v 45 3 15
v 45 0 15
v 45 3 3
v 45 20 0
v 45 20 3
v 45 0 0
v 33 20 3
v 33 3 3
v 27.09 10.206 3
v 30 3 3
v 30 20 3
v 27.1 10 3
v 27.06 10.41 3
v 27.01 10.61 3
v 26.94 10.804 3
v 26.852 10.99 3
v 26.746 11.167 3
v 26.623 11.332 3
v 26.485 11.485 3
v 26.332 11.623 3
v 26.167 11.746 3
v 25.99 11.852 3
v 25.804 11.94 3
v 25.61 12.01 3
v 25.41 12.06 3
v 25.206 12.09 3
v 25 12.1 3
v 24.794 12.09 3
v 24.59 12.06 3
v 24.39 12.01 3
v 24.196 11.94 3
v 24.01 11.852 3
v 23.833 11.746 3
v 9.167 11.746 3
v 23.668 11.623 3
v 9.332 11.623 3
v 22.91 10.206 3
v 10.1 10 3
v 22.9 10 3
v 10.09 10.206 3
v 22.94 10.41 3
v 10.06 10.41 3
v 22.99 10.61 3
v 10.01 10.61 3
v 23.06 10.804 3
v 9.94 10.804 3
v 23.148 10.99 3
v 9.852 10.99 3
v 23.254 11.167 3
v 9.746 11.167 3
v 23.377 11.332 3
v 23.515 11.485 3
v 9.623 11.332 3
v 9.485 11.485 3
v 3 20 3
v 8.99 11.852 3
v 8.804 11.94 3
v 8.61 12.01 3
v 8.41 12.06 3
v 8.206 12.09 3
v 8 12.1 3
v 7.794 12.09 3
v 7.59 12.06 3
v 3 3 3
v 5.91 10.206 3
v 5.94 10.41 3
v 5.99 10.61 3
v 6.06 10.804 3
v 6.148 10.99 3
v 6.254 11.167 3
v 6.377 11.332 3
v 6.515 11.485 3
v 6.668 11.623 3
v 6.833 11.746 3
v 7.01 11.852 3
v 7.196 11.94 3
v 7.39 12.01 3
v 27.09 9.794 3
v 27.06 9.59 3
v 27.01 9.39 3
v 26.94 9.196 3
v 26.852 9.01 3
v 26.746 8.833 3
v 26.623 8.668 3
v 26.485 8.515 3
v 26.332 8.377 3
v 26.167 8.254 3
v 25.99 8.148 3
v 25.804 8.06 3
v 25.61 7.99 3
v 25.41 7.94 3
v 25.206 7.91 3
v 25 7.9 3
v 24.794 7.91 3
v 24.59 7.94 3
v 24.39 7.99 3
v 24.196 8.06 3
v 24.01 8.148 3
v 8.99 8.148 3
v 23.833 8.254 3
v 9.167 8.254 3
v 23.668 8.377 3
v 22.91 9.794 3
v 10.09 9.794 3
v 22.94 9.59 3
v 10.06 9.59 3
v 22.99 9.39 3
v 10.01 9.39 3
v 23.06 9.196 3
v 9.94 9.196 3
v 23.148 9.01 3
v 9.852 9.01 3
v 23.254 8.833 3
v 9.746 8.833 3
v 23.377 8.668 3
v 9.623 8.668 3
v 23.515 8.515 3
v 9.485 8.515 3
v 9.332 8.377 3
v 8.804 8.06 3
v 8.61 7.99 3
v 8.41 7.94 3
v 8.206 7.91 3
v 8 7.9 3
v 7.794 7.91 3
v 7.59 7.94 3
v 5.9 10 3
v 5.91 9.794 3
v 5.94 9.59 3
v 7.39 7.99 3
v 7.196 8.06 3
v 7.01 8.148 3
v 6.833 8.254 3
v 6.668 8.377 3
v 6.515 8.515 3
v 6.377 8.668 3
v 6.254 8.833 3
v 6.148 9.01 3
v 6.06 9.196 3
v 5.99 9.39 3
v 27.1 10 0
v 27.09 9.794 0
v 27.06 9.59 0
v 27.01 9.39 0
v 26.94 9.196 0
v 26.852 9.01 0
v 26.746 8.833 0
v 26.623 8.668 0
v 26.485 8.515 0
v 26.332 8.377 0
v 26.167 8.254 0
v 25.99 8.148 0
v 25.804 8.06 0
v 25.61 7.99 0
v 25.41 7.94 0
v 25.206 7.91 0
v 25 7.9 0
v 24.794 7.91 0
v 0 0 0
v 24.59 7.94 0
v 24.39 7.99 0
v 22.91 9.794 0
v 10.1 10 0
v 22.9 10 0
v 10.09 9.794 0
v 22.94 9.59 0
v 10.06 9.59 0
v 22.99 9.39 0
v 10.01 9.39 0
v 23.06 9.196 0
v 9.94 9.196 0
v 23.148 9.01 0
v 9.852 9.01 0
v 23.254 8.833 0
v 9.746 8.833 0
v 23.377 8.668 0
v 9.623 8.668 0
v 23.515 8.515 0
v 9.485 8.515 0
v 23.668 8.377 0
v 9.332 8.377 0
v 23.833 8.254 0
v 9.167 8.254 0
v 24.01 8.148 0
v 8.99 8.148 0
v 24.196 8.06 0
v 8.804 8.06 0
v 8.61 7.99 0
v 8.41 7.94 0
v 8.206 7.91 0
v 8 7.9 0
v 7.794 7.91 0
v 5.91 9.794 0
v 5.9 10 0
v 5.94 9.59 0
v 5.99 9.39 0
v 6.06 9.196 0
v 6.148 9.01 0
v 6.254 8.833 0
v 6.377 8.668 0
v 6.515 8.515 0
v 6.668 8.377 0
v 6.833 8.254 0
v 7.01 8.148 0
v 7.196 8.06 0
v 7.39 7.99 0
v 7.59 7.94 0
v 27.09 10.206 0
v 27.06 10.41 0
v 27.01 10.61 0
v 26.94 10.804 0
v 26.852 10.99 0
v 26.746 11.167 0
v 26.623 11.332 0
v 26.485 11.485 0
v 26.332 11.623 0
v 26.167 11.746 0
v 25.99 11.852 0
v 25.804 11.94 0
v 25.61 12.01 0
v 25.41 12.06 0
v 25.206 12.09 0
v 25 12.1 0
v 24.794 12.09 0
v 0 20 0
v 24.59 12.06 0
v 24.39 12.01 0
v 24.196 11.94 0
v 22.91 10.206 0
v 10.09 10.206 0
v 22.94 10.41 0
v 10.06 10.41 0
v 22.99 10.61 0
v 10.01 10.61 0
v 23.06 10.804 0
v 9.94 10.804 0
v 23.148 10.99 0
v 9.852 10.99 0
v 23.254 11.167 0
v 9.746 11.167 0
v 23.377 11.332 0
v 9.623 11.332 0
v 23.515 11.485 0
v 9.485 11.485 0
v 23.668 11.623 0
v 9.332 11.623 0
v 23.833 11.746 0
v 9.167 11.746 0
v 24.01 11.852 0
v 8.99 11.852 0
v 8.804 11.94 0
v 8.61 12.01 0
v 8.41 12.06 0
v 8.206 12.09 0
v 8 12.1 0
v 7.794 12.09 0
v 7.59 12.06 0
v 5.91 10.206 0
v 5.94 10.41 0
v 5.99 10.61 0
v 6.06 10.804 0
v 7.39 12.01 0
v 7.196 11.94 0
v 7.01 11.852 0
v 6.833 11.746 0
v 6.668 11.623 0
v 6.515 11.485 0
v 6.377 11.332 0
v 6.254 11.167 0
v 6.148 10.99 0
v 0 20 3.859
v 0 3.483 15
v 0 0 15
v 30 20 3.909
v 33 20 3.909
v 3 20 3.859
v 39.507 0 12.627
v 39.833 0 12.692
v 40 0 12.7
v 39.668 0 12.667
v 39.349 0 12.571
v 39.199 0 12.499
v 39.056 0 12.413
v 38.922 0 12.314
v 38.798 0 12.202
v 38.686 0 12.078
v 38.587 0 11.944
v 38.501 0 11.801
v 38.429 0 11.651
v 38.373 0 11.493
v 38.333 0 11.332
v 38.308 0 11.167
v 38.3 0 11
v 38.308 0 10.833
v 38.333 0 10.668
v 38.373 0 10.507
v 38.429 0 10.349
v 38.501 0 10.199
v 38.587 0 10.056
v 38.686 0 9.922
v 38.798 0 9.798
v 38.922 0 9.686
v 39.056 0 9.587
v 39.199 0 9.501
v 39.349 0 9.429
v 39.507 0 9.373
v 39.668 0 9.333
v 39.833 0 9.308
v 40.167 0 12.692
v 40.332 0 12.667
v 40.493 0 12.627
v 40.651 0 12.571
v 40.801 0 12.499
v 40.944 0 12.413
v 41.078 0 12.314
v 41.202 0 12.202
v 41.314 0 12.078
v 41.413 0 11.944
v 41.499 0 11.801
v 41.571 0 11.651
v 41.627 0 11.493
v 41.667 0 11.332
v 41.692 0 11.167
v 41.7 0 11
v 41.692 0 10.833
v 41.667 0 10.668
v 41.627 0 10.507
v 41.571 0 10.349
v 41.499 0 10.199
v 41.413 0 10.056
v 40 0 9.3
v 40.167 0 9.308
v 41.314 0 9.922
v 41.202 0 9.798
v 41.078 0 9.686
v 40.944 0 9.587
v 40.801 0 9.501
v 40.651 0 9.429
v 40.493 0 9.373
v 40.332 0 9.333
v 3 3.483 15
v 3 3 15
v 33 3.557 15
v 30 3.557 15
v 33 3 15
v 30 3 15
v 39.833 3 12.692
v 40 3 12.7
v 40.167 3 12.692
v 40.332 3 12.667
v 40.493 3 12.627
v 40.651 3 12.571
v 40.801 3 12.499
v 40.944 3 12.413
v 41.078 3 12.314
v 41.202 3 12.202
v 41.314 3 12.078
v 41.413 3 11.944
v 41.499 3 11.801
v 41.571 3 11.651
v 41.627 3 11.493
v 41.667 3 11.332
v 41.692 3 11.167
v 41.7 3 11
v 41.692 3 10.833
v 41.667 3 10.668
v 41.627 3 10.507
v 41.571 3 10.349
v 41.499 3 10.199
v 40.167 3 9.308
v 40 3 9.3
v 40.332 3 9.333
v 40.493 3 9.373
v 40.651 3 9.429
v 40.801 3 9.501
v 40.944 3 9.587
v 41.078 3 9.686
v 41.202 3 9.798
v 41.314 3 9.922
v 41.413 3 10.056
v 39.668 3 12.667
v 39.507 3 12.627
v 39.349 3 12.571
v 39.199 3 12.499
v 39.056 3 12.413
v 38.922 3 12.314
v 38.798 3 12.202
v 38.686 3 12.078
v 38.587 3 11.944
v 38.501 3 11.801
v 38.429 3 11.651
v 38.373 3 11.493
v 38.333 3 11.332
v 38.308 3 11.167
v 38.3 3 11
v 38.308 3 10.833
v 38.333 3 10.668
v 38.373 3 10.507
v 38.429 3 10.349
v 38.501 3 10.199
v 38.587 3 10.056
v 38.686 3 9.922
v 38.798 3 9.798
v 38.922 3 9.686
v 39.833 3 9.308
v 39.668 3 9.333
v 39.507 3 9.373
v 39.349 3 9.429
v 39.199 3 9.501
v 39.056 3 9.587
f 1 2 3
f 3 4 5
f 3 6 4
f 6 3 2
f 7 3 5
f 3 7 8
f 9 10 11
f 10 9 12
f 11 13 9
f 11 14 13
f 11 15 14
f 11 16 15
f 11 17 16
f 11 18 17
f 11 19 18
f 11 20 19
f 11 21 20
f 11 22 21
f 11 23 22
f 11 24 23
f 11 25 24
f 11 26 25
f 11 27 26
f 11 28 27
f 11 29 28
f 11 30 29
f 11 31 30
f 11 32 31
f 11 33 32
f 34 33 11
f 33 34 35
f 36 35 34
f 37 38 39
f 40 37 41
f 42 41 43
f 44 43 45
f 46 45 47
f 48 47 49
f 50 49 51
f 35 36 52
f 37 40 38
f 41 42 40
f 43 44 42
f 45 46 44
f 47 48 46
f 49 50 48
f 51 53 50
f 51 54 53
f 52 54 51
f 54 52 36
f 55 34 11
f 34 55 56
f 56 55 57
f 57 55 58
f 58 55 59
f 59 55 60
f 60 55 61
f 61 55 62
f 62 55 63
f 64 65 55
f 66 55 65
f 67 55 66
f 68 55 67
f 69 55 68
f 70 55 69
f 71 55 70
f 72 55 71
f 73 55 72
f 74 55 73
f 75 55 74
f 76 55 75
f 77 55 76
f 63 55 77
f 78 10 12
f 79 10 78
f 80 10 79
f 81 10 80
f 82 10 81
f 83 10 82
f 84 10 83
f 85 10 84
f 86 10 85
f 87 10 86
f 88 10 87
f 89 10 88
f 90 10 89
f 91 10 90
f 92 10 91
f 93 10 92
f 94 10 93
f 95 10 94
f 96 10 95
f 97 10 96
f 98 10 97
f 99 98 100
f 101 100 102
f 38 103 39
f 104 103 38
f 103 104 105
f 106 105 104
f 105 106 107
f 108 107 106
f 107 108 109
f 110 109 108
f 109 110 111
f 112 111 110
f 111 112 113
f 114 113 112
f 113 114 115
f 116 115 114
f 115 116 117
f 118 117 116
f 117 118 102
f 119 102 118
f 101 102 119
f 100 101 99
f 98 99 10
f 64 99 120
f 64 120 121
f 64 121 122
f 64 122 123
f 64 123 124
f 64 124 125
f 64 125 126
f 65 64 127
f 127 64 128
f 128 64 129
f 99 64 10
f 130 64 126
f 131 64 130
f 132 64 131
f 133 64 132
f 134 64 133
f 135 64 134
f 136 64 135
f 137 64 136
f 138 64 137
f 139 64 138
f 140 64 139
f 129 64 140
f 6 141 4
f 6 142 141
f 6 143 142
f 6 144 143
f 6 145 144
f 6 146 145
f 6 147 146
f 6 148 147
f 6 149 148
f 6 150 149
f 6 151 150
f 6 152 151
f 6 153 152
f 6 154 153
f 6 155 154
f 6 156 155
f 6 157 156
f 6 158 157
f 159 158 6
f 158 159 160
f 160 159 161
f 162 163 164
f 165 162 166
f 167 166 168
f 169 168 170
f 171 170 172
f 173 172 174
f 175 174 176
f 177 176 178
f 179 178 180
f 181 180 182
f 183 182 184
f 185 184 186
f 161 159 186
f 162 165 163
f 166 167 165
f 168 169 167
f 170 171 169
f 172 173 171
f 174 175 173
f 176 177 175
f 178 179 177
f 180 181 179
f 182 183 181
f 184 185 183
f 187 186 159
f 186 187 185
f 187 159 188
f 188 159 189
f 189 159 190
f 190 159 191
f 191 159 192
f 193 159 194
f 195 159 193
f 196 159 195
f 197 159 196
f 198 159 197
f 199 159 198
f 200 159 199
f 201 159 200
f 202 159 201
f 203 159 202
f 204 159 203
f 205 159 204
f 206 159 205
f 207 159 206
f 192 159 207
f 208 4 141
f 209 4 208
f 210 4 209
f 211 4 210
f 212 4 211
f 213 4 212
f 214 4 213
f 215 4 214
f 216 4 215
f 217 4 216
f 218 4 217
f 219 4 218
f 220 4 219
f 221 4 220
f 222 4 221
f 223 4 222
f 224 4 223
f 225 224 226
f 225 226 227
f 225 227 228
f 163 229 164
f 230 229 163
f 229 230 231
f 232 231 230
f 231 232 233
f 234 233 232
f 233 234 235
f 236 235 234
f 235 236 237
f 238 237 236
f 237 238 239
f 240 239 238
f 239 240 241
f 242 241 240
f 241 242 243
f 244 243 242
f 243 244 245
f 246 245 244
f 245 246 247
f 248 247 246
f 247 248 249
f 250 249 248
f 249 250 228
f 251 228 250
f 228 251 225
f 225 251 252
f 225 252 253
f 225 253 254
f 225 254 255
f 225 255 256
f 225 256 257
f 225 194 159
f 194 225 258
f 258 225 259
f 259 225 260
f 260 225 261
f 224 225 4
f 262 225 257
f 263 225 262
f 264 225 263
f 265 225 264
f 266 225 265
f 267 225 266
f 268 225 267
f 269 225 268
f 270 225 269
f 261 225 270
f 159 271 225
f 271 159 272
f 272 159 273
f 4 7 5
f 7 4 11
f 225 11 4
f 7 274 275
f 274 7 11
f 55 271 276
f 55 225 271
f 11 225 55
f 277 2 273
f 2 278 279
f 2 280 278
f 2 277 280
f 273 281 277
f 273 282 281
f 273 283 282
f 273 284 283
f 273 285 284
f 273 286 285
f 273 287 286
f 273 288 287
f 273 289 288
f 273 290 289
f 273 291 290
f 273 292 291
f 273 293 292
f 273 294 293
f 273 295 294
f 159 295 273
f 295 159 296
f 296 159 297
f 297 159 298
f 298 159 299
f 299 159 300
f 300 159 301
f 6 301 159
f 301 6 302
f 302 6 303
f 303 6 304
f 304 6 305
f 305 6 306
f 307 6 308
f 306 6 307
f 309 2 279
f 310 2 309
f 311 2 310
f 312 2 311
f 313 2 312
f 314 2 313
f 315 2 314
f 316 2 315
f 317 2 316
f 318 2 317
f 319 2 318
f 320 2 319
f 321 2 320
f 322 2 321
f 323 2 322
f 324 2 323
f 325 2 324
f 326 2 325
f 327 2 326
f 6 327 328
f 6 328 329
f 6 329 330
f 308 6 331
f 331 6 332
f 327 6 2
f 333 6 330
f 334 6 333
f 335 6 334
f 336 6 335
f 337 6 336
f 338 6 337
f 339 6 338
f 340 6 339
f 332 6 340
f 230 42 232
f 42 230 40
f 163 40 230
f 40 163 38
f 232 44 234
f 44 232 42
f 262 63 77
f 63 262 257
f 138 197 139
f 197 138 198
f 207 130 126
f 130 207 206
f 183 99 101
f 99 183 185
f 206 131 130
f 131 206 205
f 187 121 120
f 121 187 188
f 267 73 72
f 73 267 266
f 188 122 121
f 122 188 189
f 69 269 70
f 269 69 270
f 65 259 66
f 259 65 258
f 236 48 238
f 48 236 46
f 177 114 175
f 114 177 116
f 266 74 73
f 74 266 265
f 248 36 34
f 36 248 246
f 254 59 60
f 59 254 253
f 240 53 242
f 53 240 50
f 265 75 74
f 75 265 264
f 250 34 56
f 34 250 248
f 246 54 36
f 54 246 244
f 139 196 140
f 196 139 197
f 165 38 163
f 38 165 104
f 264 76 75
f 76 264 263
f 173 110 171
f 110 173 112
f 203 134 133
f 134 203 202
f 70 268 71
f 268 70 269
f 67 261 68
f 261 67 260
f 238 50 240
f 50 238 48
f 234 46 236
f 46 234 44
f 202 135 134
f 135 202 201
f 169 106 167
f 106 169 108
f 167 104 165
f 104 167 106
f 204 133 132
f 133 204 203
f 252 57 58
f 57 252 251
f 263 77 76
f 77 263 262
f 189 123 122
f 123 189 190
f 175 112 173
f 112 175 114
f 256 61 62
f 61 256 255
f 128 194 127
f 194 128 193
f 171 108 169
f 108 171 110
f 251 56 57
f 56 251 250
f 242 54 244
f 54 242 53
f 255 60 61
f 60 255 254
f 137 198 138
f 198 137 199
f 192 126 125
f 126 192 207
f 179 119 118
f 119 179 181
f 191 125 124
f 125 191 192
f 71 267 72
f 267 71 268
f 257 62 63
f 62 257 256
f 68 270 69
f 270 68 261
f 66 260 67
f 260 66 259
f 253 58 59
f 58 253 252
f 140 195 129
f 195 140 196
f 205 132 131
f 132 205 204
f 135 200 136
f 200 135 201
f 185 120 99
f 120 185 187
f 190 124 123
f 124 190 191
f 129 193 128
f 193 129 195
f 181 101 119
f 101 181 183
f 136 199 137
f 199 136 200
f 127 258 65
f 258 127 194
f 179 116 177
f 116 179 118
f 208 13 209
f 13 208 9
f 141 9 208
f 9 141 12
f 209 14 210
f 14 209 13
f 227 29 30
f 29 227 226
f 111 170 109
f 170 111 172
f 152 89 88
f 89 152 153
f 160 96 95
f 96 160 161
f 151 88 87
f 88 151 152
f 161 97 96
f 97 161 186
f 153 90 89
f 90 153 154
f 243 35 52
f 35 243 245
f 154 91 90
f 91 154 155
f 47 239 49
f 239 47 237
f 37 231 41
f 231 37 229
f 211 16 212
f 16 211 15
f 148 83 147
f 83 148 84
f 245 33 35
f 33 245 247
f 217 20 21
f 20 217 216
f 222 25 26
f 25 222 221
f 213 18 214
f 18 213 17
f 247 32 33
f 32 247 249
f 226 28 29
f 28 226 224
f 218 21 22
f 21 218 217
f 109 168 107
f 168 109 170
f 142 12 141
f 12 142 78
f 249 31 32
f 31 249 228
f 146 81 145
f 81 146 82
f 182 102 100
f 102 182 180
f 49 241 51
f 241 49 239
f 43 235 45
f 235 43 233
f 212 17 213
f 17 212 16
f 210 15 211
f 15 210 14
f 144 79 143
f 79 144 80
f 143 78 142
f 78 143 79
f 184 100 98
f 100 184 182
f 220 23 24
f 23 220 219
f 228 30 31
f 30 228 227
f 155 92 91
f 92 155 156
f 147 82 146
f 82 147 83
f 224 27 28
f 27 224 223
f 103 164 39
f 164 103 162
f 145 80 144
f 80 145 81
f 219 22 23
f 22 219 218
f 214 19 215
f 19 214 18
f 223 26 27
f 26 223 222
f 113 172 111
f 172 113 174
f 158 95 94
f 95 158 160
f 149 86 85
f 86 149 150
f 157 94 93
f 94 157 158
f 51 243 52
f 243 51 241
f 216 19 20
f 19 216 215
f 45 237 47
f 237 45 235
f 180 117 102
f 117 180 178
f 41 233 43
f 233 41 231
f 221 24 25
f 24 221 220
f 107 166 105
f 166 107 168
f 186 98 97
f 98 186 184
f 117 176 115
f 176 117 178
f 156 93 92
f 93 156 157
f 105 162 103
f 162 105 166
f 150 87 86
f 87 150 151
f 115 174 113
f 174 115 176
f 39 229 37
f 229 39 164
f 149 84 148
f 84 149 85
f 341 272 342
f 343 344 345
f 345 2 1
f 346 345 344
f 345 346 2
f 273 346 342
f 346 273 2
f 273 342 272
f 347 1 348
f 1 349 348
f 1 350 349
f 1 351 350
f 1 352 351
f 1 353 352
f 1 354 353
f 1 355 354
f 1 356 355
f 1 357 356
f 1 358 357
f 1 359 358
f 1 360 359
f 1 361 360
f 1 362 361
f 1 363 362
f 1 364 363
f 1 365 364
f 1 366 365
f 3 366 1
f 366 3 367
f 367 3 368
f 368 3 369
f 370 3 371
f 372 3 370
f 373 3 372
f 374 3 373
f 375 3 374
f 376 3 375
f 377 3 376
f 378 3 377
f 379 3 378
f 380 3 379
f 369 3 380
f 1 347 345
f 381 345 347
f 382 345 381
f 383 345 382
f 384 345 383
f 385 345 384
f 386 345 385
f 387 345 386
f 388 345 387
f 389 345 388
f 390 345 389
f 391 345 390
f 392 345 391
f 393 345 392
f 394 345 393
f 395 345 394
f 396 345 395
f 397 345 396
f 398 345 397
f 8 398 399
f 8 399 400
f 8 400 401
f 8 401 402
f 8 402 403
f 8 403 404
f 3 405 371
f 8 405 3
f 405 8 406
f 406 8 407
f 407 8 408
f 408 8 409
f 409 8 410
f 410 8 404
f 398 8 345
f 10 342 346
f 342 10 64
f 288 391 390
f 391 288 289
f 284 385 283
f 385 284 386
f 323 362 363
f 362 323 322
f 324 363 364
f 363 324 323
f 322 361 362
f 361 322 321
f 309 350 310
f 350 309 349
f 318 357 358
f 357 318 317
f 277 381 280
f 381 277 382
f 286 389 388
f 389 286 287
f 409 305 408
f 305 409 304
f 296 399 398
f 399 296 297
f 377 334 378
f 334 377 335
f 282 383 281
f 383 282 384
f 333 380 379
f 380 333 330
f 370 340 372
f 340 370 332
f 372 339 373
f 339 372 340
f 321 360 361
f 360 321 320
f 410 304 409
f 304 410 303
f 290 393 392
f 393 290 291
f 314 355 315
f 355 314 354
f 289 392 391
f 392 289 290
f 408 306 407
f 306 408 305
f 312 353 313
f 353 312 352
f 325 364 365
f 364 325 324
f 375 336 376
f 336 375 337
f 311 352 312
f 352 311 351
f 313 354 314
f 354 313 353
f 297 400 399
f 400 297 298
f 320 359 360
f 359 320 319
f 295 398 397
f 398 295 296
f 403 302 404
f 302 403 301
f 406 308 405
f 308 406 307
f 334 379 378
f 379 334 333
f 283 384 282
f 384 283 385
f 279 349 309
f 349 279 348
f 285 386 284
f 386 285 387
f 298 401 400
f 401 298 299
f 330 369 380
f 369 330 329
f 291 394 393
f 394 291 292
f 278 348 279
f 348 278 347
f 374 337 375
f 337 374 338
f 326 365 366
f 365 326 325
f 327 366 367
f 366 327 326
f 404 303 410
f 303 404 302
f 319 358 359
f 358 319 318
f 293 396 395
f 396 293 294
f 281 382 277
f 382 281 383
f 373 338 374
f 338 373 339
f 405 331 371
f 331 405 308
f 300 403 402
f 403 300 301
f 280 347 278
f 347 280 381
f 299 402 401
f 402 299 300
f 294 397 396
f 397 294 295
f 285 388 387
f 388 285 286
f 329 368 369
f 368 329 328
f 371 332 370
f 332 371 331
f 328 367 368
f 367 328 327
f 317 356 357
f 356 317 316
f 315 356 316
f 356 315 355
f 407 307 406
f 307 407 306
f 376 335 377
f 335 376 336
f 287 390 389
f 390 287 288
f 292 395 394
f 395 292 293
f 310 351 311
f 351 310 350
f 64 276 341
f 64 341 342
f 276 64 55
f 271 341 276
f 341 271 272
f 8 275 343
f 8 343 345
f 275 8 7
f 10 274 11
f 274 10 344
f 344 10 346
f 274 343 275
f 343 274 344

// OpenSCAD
$fn=64;
difference(){
cube([45,20,3]);
translate([8,10,-1])
cylinder(d=4.2,h=5);
translate([25,10,-1])
cylinder(d=4.2,h=5);
}
difference(){
cube([45,3,15]);
translate([40,4,11])
rotate([90,0,0])
cylinder(d=3.4,h=5);
}
difference(){
cube([3,20,15]);
translate([-1,2,16])
rotate(a=34, v=[-1,0,0])
cube([5,25,20]);
}


difference(){
translate([30,0,0])
cube([3,20,15]);
translate([29,2,16.05])
rotate(a=34, v=[-1,0,0])
cube([5,25,20]);
}
